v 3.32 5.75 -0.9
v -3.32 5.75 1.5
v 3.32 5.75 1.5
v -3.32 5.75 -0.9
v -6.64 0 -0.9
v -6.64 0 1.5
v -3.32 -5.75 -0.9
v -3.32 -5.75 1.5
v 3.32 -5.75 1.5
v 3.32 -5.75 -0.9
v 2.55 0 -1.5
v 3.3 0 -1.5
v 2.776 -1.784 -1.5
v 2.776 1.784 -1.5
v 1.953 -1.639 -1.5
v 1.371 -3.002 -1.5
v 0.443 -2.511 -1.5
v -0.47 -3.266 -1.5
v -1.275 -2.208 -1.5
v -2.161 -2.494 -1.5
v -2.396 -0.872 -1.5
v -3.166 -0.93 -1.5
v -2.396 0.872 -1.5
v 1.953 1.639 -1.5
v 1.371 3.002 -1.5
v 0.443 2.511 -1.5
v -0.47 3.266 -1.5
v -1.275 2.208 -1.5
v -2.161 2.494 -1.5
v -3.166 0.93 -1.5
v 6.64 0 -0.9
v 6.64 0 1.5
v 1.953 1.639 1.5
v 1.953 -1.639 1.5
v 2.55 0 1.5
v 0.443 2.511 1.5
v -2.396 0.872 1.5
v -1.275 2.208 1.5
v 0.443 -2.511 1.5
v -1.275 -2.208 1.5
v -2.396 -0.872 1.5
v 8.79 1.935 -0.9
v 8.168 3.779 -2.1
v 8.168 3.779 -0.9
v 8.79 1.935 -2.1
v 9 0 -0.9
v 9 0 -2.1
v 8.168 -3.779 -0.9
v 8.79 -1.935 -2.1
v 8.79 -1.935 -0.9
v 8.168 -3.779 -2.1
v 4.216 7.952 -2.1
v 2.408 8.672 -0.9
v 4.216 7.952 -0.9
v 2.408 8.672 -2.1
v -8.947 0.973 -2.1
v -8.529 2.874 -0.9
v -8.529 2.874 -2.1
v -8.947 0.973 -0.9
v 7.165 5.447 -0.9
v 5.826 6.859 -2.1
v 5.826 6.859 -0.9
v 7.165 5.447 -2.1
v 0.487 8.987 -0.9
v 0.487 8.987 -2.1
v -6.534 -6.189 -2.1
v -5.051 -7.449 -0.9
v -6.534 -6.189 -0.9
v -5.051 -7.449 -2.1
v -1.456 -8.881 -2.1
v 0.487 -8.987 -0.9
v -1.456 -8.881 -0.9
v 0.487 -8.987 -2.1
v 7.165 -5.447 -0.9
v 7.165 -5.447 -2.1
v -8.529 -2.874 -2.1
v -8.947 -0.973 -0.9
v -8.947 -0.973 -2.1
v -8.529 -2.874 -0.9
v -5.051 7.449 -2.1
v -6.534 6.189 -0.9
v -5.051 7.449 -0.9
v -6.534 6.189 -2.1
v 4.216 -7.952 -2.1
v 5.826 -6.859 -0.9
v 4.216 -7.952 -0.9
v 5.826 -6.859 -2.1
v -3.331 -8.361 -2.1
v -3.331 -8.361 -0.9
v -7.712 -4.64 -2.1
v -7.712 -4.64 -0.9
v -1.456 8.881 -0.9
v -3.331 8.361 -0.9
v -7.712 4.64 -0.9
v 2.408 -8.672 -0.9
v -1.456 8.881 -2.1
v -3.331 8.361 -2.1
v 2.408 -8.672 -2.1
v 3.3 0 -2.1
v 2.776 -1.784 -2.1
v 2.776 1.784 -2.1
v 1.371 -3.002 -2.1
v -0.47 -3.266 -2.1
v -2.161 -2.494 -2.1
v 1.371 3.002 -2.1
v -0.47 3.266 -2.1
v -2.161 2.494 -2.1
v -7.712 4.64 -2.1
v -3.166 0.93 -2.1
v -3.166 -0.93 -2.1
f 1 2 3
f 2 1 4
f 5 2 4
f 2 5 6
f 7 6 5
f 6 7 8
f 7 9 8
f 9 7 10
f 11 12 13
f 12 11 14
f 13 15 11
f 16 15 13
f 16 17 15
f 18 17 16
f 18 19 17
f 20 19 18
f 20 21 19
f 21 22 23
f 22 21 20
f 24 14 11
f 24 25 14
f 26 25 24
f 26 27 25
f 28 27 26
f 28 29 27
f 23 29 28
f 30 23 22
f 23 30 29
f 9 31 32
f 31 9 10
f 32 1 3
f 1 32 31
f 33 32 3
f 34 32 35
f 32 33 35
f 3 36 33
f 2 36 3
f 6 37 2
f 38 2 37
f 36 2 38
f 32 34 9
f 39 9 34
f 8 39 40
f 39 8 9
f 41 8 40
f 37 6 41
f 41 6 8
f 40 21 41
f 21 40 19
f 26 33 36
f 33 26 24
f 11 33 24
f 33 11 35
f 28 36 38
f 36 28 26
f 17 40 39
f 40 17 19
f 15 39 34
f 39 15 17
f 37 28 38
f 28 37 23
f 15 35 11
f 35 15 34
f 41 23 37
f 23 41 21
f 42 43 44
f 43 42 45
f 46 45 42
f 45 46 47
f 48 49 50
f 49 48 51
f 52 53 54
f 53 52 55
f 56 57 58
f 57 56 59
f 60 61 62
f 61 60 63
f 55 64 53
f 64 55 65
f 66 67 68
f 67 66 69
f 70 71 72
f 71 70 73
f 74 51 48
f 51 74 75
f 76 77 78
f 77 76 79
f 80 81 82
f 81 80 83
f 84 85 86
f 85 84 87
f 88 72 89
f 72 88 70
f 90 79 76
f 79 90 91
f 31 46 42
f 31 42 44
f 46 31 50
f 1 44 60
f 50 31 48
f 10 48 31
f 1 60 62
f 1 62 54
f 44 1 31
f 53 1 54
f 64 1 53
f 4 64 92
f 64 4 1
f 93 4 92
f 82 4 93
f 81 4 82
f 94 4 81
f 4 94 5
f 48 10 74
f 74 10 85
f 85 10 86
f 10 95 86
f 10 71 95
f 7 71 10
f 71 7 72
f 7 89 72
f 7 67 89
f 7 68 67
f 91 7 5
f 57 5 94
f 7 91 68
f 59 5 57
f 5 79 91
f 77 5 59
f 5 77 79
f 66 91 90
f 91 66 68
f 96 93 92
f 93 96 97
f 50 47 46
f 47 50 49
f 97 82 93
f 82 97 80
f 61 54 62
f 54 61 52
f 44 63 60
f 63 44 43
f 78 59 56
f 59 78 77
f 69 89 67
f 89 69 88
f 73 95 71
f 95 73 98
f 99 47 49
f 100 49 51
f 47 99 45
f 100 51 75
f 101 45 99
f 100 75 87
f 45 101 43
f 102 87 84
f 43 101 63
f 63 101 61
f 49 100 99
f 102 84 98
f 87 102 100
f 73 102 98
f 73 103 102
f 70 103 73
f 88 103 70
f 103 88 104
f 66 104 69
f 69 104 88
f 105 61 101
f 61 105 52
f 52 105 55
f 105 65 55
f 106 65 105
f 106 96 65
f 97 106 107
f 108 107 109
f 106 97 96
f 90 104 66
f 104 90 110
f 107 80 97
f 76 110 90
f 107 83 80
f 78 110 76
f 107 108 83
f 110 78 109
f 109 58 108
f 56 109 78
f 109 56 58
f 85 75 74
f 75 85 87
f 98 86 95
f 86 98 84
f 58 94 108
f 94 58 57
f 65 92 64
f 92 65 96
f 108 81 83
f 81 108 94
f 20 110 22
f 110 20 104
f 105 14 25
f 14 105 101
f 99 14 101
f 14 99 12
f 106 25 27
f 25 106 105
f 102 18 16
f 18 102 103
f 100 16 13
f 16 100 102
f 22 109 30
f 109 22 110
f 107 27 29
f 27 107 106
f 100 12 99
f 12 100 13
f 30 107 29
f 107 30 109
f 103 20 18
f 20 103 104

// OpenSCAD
// Parameters
thread_diameter = 6; //[3:12:0.1]
across_flats = 11.5; //[6:23:0.1]
thickness = 3; //[1.5:6:0.1]
hole_type = 0; //[0:1:1]
clearance_factor = 1.1; //[1.02:1.25:0.01]
tapping_factor = 0.85; //[0.7:0.95:0.01]
hole_diameter = thread_diameter * (tapping_factor + (clearance_factor - tapping_factor) * hole_type); //[4:10:0.1]
eps = 0.6; //[0.2:1.5:0.1]
washer_outer_diameter = 18; //[12:30:0.5]
washer_thickness = 1.2; //[0.6:3:0.1]
washer_hole_diameter = 6.6; //[4:10:0.1]

// Hexagonal Nut Profile
module flat_to_flat_hex_profile() {
  linear_extrude(height=thickness, center=true) {
    polygon(points=[
      [across_flats/(2*sqrt(3)), across_flats/2],
      [across_flats/sqrt(3), 0],
      [across_flats/(2*sqrt(3)), -across_flats/2],
      [-across_flats/(2*sqrt(3)), -across_flats/2],
      [-across_flats/sqrt(3), 0],
      [-across_flats/(2*sqrt(3)), across_flats/2]
    ]);
  }
}

// Central Through Hole
module central_through_hole() {
  cylinder(r=hole_diameter/2, h=thickness + 2*eps, center=true);
}

// Washer Outer
module washer_outer() {
  cylinder(r=washer_outer_diameter/2, h=washer_thickness, center=true);
}

// Washer Hole
module washer_hole() {
  cylinder(r=washer_hole_diameter/2, h=washer_thickness + 2*eps, center=true);
}

// Hex Nut Body
module hex_nut_body() {
  difference() {
    flat_to_flat_hex_profile();
    central_through_hole();
  }
}

// Washer Solid
module washer_solid() {
  difference() {
    washer_outer();
    washer_hole();
  }
}

// Positioned Washer
module washer_positioned() {
  translate([0, 0, -(thickness/2 + washer_thickness/2 - eps)]) {
    washer_solid();
  }
}

// Nut and Washer Assembly
module nut_and_washer() {
  union() {
    hex_nut_body();
    washer_positioned();
  }
}

// Final Assembly
module assembly() {
  nut_and_washer();
}

assembly();
